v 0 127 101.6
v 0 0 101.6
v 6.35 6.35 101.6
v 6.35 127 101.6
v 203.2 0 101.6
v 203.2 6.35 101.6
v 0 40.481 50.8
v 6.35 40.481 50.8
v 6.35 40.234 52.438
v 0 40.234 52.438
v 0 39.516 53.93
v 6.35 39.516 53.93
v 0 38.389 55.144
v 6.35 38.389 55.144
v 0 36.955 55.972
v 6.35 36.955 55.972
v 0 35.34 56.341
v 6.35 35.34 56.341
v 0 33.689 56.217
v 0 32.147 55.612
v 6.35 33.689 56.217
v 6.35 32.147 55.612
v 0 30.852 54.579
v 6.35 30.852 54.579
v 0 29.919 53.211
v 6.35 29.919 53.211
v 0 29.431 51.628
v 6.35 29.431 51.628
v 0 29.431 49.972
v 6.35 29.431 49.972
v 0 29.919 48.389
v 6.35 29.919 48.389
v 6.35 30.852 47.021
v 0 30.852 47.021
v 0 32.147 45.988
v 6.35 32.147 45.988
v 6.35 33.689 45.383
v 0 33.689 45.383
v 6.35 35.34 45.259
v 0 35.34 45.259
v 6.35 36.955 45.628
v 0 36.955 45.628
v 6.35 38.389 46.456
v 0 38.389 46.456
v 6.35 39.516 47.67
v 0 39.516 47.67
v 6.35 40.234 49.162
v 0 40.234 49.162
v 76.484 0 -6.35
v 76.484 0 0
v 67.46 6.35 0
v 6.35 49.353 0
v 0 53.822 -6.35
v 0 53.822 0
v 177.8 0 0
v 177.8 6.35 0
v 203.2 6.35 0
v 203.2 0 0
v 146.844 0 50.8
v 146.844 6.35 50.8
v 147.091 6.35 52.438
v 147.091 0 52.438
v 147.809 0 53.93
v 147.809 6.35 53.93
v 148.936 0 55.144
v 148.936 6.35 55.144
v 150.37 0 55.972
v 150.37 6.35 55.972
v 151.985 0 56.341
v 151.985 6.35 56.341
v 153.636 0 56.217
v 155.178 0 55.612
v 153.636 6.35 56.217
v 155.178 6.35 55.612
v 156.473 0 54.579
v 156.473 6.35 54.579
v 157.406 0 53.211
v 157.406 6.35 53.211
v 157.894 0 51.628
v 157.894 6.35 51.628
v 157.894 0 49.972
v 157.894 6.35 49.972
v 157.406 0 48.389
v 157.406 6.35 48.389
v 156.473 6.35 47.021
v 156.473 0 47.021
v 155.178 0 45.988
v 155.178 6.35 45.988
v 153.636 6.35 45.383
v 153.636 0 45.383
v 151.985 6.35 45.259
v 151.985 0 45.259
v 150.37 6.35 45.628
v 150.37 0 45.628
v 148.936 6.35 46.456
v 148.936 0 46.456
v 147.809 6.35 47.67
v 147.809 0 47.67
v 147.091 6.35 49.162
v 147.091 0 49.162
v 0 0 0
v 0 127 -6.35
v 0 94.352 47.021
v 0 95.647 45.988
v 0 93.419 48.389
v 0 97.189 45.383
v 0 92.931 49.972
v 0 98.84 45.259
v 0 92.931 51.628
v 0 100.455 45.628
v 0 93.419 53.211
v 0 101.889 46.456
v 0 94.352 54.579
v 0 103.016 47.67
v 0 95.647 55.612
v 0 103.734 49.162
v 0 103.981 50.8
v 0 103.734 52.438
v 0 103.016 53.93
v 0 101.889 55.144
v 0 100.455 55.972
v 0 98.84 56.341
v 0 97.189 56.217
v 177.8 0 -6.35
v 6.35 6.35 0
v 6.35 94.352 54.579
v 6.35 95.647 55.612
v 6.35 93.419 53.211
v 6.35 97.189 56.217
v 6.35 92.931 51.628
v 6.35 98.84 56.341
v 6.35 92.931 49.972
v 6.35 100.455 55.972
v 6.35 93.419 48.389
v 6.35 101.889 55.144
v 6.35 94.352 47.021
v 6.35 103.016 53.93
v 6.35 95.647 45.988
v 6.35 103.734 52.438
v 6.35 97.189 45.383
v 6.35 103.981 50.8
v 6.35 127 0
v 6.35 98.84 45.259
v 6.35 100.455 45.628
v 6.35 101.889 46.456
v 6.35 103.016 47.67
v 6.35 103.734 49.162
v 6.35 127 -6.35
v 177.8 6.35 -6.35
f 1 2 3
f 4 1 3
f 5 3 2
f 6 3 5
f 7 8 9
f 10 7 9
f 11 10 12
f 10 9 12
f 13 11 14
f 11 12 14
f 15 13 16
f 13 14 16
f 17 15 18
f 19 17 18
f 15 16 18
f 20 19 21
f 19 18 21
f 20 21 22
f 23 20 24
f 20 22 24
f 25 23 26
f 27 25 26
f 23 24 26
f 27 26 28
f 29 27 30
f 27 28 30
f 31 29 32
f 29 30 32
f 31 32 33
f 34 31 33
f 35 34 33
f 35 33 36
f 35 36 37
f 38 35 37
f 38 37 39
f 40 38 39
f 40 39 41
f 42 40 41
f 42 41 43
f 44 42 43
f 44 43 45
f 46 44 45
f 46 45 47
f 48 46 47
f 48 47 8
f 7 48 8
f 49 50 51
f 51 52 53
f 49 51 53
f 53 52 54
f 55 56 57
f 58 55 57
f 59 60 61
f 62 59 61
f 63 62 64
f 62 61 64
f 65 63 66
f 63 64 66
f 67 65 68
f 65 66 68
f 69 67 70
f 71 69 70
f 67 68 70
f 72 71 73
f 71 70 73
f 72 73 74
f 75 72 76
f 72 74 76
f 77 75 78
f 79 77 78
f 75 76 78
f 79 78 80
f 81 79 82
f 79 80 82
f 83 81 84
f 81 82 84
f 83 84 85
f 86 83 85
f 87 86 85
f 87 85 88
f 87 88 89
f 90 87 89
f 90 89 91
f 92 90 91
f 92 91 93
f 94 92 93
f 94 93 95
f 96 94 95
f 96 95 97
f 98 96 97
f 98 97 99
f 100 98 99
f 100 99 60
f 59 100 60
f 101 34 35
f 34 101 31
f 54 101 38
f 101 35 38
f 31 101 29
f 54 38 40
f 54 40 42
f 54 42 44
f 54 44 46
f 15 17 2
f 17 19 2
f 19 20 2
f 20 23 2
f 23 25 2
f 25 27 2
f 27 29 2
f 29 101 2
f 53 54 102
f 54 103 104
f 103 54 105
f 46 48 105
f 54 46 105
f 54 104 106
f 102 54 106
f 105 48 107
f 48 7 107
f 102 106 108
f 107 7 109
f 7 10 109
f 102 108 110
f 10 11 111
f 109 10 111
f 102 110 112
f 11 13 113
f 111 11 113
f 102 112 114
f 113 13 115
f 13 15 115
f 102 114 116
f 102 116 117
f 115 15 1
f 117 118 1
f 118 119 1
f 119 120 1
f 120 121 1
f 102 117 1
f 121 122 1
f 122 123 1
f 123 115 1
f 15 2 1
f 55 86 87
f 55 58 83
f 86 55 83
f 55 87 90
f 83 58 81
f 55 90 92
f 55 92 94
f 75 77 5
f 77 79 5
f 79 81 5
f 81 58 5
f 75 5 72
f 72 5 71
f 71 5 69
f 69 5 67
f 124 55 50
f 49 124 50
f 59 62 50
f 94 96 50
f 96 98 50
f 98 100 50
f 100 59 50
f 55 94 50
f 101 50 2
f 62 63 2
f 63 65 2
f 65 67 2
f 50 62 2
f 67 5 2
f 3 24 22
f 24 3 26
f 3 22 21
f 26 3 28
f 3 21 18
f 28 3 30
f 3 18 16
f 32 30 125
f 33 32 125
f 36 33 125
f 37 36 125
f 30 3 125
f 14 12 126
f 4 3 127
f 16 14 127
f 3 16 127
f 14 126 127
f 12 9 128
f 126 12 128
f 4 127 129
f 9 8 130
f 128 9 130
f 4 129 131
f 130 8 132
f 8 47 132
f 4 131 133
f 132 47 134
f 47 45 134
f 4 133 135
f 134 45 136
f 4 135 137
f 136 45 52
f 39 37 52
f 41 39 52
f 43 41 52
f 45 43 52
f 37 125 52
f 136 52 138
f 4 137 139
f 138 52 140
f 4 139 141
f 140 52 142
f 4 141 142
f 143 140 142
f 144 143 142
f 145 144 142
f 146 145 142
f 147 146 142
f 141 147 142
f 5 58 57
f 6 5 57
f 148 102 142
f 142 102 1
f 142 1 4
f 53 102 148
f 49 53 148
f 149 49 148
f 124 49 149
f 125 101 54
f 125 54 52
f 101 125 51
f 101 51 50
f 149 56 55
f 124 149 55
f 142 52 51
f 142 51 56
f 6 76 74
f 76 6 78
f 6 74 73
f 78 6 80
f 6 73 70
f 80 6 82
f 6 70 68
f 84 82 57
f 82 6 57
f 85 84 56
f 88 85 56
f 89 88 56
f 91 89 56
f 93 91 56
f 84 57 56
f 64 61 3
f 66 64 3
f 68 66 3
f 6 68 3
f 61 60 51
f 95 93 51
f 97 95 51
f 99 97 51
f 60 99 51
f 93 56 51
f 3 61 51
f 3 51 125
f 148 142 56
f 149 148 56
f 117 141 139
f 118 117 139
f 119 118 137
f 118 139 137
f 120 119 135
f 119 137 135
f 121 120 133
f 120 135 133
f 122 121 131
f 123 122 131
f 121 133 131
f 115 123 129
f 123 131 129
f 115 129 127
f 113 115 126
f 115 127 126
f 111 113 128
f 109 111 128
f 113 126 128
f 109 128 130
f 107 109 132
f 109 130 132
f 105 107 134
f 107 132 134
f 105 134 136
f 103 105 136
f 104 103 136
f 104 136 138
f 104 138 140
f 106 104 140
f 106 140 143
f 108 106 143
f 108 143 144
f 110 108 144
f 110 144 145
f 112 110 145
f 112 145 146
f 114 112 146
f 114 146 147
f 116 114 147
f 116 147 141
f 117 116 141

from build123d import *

# Parameters (mm, degrees)
F1_DEPTH = 101.6
F3_DEPTH = 6.35
F4_R     = 5.55625
F5_DEPTH = 6.351
F6_R     = 5.55625
F7_DEPTH = 6.351


with BuildPart() as f1:
    # F0 (on Top) → F1 (new body)
    with BuildSketch(Plane.XY):
        Polygon((6.35, 127), (0, 127), (0, 0), (203.2, 0), (203.2, 6.35), (6.35, 6.35), align=None)
    extrude(amount=F1_DEPTH)

    # F2 (on face) → F3 (join)
    with BuildSketch(Plane(origin=(0, 0, 0), x_dir=(1, 0, 0), z_dir=(0, 0, -1))):
        Polygon((0, -127), (6.35, -127), (177.8, -6.35), (177.8, 0), (76.483584, 0), (0, -53.821781), align=None)
    extrude(amount=F3_DEPTH)

    # F4 (on face) → F5 (cut, through all)
    with BuildSketch(Plane.YZ.offset(6.35)):
        with Locations((34.925, 50.8)):
            Circle(F4_R)
        with Locations((98.425, 50.8)):
            Circle(F4_R)
    extrude(amount=-F5_DEPTH, mode=Mode.SUBTRACT)

    # F6 (on face) → F7 (cut, through all)
    with BuildSketch(Plane(origin=(0, 6.35, 0), x_dir=(-1, 0, 0), z_dir=(0, 1, 0))):
        with Locations((-152.4, 50.8)):
            Circle(F6_R)
    extrude(amount=-F7_DEPTH, mode=Mode.SUBTRACT)


solid = f1.part
